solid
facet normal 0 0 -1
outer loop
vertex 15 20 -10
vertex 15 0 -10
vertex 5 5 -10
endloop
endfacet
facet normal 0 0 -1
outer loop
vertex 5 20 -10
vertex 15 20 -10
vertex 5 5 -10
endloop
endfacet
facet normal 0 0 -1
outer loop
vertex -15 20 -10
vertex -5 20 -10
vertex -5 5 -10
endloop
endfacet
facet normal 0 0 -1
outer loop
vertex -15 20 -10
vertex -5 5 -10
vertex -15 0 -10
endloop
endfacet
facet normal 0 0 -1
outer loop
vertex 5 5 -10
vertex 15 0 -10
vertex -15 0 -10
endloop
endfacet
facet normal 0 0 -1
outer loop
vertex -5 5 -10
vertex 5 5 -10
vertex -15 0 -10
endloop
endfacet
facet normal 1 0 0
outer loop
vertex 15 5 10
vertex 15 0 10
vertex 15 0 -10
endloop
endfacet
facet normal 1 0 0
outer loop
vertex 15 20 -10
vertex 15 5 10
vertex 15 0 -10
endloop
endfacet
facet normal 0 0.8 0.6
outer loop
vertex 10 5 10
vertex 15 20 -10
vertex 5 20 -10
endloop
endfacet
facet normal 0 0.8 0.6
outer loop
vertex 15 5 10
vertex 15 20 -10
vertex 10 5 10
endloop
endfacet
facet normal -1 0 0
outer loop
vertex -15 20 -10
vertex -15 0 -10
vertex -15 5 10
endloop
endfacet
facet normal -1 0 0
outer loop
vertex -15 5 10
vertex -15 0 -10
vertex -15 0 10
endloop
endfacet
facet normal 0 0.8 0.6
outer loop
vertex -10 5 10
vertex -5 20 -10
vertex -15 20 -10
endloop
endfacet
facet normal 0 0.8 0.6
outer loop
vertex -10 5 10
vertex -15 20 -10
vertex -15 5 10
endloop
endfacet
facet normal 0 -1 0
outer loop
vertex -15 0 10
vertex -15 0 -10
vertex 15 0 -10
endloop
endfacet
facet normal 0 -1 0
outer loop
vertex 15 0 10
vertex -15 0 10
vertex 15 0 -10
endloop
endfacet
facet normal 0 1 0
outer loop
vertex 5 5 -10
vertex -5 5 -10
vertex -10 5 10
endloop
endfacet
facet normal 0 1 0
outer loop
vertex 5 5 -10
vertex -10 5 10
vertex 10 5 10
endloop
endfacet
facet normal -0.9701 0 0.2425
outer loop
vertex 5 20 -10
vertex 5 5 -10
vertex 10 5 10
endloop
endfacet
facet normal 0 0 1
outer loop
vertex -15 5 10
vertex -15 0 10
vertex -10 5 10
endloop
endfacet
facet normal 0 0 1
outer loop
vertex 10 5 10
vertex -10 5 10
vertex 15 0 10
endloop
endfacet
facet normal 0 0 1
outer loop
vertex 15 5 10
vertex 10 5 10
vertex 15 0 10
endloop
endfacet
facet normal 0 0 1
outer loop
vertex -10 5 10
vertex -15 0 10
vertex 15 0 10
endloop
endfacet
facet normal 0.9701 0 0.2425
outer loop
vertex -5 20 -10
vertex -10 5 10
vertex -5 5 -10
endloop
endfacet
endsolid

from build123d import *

# Parameters (mm, degrees)
SKETCH_1_W          = 30
SKETCH_1_H          = 20
EXTRUDE_1_DEPTH     = 5
EXTRUDE_2_DEPTH     = 20
CUT_EXTRUDE_1_DEPTH = 45


with BuildPart() as part:
    # 草圖1 → 填料-伸長1 (new body)
    with BuildSketch(Plane(origin=(0, 0, 0), x_dir=(1, 0, 0), z_dir=(0, 1, 0))):
        Rectangle(SKETCH_1_W, SKETCH_1_H)
    extrude(amount=EXTRUDE_1_DEPTH)

    # 草圖1<3> → 填料-伸長2 (add)
    with BuildSketch(Plane(origin=(0, 0, 0), x_dir=(1, 0, 0), z_dir=(0, 1, 0))):
        Polygon((-10, -10), (-5, 10), (-15, 10), (-15, -10), align=None)
        Polygon((15, 10), (5, 10), (10, -10), (15, -10), align=None)
    extrude(amount=EXTRUDE_2_DEPTH)

    # 草圖2 → 除料-伸長1 (cut)
    with BuildSketch(Plane(origin=(15, 0, 0), x_dir=(0, 0, -1), z_dir=(1, 0, 0))):
        Polygon((10, 20), (-10, 5), (-10, 20), align=None)
    extrude(amount=-CUT_EXTRUDE_1_DEPTH, mode=Mode.SUBTRACT)


solid = part.part
